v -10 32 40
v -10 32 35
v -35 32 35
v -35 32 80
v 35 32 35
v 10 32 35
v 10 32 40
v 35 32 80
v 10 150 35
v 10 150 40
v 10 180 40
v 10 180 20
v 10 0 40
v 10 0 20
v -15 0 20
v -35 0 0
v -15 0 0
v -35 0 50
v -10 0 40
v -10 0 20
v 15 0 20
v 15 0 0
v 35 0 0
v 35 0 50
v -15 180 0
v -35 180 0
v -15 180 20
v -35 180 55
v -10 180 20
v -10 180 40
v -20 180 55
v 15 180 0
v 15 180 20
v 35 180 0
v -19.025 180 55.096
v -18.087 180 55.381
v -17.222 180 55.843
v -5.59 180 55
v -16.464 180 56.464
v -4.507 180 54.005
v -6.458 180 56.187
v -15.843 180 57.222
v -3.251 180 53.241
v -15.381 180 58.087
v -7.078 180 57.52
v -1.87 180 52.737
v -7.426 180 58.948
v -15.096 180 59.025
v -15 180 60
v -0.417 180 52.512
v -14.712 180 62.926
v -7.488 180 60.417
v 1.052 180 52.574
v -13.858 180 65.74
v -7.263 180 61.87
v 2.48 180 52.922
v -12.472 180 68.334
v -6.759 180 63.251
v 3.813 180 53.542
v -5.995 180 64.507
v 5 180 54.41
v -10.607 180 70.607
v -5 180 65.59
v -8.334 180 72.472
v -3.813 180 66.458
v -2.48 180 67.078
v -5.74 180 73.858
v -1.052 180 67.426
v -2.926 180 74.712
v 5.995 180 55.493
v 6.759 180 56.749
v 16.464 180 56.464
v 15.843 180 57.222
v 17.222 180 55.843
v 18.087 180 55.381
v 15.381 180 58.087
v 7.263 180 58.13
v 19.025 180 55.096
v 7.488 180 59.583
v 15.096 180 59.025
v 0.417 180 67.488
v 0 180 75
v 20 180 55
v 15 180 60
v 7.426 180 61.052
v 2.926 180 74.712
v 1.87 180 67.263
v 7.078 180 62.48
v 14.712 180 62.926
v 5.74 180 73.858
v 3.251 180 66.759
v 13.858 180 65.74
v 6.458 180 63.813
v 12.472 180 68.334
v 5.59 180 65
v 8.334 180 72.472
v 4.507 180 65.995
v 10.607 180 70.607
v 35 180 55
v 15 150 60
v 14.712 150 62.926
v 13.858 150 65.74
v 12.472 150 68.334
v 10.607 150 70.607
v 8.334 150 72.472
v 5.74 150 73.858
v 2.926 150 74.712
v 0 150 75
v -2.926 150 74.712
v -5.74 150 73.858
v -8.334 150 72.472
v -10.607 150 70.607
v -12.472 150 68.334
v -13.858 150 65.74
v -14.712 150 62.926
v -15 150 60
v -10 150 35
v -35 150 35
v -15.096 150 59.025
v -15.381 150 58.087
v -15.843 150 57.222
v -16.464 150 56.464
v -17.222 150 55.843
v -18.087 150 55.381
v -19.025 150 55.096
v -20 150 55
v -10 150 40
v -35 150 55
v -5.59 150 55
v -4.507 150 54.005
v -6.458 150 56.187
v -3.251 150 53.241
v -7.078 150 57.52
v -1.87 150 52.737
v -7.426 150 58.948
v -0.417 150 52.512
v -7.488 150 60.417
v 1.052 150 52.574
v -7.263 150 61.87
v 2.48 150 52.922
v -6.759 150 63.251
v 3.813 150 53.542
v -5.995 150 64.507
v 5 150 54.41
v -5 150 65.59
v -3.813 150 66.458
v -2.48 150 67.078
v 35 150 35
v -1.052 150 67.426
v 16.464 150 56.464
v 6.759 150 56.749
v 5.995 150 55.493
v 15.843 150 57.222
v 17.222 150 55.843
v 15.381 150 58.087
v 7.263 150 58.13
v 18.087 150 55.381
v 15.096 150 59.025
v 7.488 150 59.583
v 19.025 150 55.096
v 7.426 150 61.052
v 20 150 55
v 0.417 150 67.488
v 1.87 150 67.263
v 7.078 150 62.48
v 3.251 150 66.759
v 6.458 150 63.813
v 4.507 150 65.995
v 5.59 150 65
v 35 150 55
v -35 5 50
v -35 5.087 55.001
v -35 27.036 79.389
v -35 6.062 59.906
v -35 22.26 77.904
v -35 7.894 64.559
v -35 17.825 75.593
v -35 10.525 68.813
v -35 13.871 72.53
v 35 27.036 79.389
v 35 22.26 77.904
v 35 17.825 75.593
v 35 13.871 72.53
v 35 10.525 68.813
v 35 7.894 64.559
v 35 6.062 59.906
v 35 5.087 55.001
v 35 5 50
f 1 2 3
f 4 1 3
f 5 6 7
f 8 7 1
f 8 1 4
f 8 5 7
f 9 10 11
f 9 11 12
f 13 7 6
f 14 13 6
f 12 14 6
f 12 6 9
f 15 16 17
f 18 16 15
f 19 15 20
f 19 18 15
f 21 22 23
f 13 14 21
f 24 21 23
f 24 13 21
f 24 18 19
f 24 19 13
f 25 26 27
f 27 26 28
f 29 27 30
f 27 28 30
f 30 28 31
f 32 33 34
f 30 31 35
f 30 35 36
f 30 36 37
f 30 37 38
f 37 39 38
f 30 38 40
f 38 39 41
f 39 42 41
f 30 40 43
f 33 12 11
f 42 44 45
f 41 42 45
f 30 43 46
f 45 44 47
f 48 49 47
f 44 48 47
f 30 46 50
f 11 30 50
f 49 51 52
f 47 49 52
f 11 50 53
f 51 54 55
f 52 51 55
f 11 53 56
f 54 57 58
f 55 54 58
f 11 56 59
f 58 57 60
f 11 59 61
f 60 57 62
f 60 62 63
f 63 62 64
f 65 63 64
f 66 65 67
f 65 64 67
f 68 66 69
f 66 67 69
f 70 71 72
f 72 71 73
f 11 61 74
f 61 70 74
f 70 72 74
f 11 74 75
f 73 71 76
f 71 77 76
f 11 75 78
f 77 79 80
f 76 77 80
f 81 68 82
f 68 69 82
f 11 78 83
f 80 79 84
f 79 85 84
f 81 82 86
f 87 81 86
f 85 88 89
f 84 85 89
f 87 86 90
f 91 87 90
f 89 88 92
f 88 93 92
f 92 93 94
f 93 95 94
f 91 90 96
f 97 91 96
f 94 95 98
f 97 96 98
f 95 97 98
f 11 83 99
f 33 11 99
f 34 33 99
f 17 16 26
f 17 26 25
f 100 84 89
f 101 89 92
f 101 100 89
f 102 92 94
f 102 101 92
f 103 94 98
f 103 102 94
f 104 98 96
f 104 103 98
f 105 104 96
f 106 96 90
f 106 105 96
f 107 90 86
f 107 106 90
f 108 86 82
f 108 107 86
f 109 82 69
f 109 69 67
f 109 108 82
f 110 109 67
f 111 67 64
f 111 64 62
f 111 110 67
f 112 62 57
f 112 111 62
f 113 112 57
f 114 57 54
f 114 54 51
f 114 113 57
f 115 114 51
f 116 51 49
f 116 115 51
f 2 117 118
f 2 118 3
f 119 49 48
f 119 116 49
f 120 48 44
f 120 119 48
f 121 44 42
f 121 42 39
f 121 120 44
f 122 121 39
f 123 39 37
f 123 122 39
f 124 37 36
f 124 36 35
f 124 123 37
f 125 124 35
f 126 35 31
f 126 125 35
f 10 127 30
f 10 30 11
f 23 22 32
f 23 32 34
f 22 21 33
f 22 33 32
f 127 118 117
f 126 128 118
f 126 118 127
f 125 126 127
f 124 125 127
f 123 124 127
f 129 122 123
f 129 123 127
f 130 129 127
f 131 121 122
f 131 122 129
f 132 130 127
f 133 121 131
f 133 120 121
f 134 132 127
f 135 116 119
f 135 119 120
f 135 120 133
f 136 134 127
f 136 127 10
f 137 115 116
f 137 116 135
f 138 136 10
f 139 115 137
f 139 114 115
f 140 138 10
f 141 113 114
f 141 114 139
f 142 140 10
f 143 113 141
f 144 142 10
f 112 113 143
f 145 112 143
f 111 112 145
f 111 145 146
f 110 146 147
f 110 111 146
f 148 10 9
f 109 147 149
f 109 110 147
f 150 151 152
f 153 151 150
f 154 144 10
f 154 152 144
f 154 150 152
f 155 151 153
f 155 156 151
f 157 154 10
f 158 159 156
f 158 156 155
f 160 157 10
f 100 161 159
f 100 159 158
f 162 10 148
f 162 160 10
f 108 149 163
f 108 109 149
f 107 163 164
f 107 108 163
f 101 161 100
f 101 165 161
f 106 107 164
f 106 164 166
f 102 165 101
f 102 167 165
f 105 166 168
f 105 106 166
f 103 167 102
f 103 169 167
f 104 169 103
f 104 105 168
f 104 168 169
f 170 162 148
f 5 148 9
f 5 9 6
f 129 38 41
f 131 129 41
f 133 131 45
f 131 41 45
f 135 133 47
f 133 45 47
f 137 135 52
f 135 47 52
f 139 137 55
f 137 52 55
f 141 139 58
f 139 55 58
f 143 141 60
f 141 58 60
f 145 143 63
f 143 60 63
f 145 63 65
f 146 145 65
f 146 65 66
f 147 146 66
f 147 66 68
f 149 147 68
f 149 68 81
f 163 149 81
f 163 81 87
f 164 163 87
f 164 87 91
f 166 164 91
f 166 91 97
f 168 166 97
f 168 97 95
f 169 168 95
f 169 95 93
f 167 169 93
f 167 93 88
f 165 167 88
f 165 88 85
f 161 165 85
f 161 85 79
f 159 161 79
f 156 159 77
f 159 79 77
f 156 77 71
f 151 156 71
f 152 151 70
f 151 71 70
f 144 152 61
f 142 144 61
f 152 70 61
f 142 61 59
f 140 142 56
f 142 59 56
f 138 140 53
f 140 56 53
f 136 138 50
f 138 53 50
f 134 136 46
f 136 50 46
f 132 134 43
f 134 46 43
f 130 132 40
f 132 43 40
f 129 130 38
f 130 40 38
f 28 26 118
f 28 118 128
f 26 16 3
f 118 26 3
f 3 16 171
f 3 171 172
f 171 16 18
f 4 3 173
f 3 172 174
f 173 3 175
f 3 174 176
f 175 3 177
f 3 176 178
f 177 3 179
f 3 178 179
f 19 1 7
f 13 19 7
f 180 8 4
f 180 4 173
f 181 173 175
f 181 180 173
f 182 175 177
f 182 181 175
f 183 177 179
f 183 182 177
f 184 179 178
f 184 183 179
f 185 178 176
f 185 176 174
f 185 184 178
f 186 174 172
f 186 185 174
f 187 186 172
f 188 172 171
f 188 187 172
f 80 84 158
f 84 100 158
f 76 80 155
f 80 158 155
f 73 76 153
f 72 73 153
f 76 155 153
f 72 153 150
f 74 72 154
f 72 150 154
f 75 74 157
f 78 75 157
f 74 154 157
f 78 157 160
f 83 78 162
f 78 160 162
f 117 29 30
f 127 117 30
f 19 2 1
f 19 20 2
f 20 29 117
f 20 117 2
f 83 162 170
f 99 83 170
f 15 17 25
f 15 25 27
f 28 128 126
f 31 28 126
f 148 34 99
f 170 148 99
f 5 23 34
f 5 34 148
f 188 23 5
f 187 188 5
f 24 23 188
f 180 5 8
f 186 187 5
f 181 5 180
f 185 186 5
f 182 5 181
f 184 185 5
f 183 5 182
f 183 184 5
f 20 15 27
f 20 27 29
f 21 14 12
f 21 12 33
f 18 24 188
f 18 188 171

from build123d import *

# Parameters (mm, degrees)
PAD_DEPTH       = 180
SKETCH001_W     = 29.620193
SKETCH001_H     = 118
POCKET_DEPTH    = 70.001
SKETCH002_W     = 70
SKETCH002_H     = 7.16013
PAD001_DEPTH    = 30
SKETCH003_R     = 15
SKETCH003_R_2   = 7.5
PAD002_DEPTH    = 30
FILLET_R        = 5
FILLET001_R     = 5
SKETCH004_R     = 7.5
POCKET001_DEPTH = 30
PAD003_DEPTH    = 70


with BuildPart() as part:
    # Sketch → Pad (new body)
    with BuildSketch(Plane.XZ):
        Polygon((15, 0), (35, 0), (35, 50), (-35, 50), (-35, 0), (-15, 0), (-15, 20), (-10, 20), (-10, 40), (10, 40), (10, 20), (15, 20), align=None)
    extrude(amount=-PAD_DEPTH)

    # Sketch001 → Pocket (cut, through all)
    with BuildSketch(Plane(origin=(35, 0, 0), x_dir=(0, 0, 1), z_dir=(1, 0, 0))):
        with Locations((49.810097, -91)):
            Rectangle(SKETCH001_W, SKETCH001_H)
    extrude(amount=-POCKET_DEPTH, mode=Mode.SUBTRACT)

    # Sketch002 → Pad001 (new body)
    with BuildSketch(Plane(origin=(0, 180, 0), x_dir=(1, 0, 0), z_dir=(0, 1, 0))):
        with Locations((0, -51.419935)):
            Rectangle(SKETCH002_W, SKETCH002_H)
    extrude(amount=-PAD001_DEPTH)

    # Sketch003 → Pad002 (new body)
    with BuildSketch(Plane.XZ.offset(-150)):
        with Locations((0, 60)):
            Circle(SKETCH003_R)
        with Locations((0, 60)):
            Circle(SKETCH003_R_2, mode=Mode.SUBTRACT)
    extrude(amount=-PAD002_DEPTH)

    # Fillet
    fillet_edges = [part.edges().sort_by_distance(p)[0] for p in [
        (14.142136, 165, 55),
    ]]
    fillet(fillet_edges, radius=FILLET_R)

    # Fillet001
    fillet001_edges = [part.edges().sort_by_distance(p)[0] for p in [
        (-14.142136, 165, 55),
    ]]
    fillet(fillet001_edges, radius=FILLET001_R)

    # Sketch004 → Pocket001 (cut)
    with BuildSketch(Plane(origin=(0, 180, 0), x_dir=(1, 0, 0), z_dir=(0, 1, 0))):
        with Locations((0, -60)):
            Circle(SKETCH004_R)
    extrude(amount=-POCKET001_DEPTH, mode=Mode.SUBTRACT)

    # Sketch005 → Pad003 (new body)
    with BuildSketch(Plane(origin=(35, 0, 0), x_dir=(0, 0, 1), z_dir=(1, 0, 0))):
        with BuildLine():
            Line((50, -32), (80, -32))
            ThreePointArc((80, -32), (70.746374, -12.11514), (50, -5))
            Line((50, -32), (50, -5))
        make_face()
    extrude(amount=-PAD003_DEPTH)


solid = part.part
